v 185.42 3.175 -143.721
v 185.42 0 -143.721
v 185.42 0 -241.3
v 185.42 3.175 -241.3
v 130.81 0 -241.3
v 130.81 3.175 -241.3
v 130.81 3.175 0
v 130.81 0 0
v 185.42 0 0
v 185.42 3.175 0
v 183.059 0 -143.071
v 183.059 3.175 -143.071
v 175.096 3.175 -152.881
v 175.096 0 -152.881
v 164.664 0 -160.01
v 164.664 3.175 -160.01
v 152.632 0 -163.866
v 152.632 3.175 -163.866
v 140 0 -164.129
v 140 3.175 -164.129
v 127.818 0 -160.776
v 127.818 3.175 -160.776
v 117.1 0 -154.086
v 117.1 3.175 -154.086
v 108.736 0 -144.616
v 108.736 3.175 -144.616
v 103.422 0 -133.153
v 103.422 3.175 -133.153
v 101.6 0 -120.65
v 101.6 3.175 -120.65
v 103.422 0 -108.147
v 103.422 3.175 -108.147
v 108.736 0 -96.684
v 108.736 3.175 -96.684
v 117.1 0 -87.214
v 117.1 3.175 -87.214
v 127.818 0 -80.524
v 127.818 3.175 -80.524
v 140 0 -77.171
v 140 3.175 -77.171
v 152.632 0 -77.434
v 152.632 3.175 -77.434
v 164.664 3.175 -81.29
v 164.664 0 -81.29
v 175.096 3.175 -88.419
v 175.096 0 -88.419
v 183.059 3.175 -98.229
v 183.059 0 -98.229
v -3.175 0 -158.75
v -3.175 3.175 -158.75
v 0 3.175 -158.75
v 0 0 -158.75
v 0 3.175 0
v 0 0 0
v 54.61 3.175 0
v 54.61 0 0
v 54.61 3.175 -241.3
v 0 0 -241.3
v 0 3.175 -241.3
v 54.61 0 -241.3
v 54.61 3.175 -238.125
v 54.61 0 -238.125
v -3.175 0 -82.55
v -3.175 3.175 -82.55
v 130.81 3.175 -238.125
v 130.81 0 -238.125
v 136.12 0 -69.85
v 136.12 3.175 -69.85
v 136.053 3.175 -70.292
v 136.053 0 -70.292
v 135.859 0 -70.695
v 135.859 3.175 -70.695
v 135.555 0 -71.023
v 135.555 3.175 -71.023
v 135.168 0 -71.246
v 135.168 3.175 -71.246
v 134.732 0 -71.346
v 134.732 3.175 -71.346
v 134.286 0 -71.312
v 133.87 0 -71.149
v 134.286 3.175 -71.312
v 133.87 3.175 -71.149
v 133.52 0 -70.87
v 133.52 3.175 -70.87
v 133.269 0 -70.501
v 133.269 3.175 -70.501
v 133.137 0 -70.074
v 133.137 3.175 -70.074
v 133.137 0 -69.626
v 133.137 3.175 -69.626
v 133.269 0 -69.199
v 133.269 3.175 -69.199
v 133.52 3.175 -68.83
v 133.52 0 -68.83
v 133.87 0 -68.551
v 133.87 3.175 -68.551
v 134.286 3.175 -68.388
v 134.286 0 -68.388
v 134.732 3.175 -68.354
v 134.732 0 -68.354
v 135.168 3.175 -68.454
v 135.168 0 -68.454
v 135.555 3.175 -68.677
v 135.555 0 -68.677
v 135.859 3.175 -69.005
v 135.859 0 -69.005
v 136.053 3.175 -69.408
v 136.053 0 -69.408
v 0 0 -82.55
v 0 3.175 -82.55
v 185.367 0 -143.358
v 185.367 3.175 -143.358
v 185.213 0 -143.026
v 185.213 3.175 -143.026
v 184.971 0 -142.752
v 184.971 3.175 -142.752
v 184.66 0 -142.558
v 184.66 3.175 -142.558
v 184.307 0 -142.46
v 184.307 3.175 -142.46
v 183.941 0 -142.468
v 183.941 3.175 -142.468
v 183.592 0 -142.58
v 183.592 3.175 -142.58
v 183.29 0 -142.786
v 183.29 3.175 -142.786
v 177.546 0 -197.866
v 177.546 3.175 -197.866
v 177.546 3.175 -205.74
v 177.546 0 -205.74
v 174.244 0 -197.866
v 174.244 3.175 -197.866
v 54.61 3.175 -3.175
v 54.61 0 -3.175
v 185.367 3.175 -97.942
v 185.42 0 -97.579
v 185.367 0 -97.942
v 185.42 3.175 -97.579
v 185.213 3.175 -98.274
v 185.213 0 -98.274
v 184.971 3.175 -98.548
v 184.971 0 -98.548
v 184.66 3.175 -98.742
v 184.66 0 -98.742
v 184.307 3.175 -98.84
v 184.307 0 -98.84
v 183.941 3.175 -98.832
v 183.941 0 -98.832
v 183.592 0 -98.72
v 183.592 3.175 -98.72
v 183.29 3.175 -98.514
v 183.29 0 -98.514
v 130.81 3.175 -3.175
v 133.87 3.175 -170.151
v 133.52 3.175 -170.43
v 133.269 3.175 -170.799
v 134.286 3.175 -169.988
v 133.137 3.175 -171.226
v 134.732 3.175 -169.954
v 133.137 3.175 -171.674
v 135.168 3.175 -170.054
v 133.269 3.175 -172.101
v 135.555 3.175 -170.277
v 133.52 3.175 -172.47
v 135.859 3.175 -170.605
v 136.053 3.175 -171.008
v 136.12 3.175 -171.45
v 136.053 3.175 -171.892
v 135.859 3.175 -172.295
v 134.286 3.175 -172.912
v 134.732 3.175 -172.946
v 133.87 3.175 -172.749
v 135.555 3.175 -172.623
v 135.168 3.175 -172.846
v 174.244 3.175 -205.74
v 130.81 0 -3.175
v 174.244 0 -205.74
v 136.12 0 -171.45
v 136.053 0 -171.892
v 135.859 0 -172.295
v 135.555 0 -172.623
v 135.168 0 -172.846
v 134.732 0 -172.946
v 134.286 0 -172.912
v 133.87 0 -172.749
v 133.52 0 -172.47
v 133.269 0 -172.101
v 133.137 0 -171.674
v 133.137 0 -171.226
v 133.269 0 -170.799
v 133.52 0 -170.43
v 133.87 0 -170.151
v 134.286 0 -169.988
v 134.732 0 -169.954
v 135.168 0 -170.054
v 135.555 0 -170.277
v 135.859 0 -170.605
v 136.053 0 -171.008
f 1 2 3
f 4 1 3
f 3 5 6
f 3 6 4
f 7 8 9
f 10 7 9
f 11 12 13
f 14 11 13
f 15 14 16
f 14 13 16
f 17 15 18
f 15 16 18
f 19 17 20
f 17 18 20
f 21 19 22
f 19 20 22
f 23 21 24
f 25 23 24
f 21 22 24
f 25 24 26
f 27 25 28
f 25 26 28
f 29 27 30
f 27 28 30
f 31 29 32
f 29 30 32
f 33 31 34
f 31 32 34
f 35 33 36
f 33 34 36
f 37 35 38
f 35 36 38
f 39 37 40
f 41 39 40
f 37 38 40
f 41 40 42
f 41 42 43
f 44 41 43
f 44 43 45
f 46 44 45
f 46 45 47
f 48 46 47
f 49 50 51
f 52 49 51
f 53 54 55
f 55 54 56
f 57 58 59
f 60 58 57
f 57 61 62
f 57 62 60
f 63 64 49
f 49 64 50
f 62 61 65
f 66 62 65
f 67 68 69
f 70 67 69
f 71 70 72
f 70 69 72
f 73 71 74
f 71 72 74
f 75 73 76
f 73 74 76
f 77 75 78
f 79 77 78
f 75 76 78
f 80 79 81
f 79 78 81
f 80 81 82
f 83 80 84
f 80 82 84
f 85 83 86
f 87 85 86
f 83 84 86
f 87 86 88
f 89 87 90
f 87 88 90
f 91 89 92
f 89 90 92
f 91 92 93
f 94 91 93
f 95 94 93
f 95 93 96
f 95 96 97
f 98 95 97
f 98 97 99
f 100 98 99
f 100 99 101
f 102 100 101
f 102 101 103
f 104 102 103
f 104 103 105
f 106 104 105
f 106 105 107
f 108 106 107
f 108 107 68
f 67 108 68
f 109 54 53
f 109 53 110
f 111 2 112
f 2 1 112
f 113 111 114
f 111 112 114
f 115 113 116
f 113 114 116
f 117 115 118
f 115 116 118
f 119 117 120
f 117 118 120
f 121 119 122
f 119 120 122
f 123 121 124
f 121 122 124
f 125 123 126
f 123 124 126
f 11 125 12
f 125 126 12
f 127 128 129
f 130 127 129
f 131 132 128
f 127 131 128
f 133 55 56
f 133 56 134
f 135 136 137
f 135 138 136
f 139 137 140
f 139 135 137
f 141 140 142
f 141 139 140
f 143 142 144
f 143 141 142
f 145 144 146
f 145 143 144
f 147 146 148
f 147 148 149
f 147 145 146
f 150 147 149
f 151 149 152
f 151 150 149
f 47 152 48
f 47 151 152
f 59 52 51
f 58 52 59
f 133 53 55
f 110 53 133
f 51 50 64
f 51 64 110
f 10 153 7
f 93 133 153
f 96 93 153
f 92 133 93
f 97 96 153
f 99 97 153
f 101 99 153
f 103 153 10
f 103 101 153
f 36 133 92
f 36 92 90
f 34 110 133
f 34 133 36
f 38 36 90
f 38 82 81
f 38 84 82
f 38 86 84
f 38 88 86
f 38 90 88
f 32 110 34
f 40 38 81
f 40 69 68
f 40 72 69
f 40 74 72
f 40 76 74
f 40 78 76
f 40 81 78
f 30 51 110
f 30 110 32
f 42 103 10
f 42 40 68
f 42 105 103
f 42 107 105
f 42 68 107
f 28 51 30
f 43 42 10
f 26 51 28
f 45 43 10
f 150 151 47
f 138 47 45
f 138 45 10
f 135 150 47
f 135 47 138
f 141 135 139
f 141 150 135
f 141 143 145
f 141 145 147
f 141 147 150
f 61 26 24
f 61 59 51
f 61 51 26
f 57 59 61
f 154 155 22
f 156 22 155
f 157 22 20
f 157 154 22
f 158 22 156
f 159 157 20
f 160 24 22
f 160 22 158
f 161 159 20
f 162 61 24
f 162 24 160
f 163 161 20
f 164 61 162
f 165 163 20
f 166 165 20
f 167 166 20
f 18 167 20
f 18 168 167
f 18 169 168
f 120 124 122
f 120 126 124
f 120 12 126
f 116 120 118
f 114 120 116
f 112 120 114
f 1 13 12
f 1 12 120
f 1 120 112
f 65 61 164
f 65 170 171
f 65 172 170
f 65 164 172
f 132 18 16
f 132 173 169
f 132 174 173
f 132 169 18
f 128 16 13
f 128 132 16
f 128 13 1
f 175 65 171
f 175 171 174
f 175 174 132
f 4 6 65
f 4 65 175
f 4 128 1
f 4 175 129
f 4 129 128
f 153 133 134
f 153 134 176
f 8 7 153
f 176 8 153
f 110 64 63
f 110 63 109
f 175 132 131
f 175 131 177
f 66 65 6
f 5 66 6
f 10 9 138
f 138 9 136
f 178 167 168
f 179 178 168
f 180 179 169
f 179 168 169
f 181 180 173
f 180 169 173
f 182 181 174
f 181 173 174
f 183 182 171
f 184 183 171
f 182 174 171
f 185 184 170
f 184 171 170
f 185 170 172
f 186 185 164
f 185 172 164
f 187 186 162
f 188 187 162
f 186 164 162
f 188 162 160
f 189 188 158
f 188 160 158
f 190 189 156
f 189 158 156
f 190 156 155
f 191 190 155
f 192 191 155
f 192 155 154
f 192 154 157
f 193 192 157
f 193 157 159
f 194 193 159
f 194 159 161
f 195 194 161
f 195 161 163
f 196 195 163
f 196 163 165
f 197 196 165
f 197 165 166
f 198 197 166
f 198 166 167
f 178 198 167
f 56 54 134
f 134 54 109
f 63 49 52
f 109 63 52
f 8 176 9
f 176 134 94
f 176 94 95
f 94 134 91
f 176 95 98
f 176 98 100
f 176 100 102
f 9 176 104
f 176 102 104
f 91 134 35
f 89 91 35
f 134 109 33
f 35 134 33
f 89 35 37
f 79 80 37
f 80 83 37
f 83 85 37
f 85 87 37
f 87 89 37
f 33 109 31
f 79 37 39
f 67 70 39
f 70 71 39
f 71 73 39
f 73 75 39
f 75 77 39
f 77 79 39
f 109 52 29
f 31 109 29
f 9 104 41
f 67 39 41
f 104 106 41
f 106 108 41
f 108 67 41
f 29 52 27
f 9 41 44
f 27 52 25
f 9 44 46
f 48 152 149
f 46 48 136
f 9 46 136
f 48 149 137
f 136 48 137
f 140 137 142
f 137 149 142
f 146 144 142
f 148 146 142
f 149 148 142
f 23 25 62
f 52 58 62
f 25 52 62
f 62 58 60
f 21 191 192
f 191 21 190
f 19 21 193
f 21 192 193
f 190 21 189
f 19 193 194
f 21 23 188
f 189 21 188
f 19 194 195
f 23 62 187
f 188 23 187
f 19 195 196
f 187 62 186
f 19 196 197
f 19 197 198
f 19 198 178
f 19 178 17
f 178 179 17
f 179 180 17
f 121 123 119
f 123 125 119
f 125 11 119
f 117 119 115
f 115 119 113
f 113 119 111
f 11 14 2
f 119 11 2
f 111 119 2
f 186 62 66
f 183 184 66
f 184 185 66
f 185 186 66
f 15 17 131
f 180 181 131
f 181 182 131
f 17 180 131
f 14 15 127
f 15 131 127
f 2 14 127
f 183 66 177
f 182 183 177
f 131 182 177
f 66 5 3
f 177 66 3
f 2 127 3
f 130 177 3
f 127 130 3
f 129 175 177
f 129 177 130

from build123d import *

# Parameters (mm, degrees)
SKETCH1_W           = 185.42
SKETCH1_H           = 241.3
BOSS_EXTRUDE1_DEPTH = 3.175
SKETCH2_R           = 43.815
CUT_EXTRUDE1_DEPTH  = 4.175
SKETCH7_R           = 1.5
CUT_EXTRUDE4_DEPTH  = 4.175
FILLET1_R           = 1.27
SKETCH8_W           = 76.2
SKETCH8_H           = 3.175
CUT_EXTRUDE5_DEPTH  = 4.175
SKETCH11_W          = 3.175
SKETCH11_H          = 76.2
BOSS_EXTRUDE3_DEPTH = 3.175
SKETCH12_W          = 3.302
SKETCH12_H          = 7.874
CUT_EXTRUDE6_DEPTH  = 4.175


with BuildPart() as part:
    # Sketch1 → Boss-Extrude1 (new body)
    with BuildSketch(Plane(origin=(0, 0, 0), x_dir=(1, 0, 0), z_dir=(0, 1, 0))):
        with Locations((92.71, 120.65)):
            Rectangle(SKETCH1_W, SKETCH1_H)
    extrude(amount=BOSS_EXTRUDE1_DEPTH)

    # Sketch2 → Cut-Extrude1 (cut, through all)
    with BuildSketch(Plane(origin=(0, 3.175, 0), x_dir=(1, 0, 0), z_dir=(0, 1, 0))):
        with Locations((145.415, 120.65)):
            Circle(SKETCH2_R)
    extrude(amount=-CUT_EXTRUDE1_DEPTH, mode=Mode.SUBTRACT)

    # Sketch7 → Cut-Extrude4 (cut, through all)
    with BuildSketch(Plane(origin=(0, 3.175, 0), x_dir=(1, 0, 0), z_dir=(0, 1, 0))):
        with Locations((134.62, 171.45)):
            Circle(SKETCH7_R)
        with Locations((134.62, 69.85)):
            Circle(SKETCH7_R)
    extrude(amount=-CUT_EXTRUDE4_DEPTH, mode=Mode.SUBTRACT)

    # Fillet1
    fillet1_edges = [part.edges().sort_by_distance(p)[0] for p in [
        (185.42, 1.5875, -102.779515955),
        (185.42, 1.5875, -138.520484045),
    ]]
    fillet(fillet1_edges, radius=FILLET1_R)

    # Sketch8 → Cut-Extrude5 (cut, through all)
    with BuildSketch(Plane(origin=(0, 3.175, 0), x_dir=(1, 0, 0), z_dir=(0, 1, 0))):
        with Locations((92.71, 239.7125)):
            Rectangle(SKETCH8_W, SKETCH8_H)
        with Locations((92.71, 1.5875)):
            Rectangle(SKETCH8_W, SKETCH8_H)
    extrude(amount=-CUT_EXTRUDE5_DEPTH, mode=Mode.SUBTRACT)

    # Sketch11 → Boss-Extrude3 (add)
    with BuildSketch(Plane(origin=(0, 3.175, 0), x_dir=(1, 0, 0), z_dir=(0, 1, 0))):
        with Locations((-1.5875, 120.65)):
            Rectangle(SKETCH11_W, SKETCH11_H)
    extrude(amount=-BOSS_EXTRUDE3_DEPTH)

    # Sketch12 → Cut-Extrude6 (cut, through all)
    with BuildSketch(Plane(origin=(0, 3.175, 0), x_dir=(1, 0, 0), z_dir=(0, 1, 0))):
        with Locations((175.895, 201.803)):
            Rectangle(SKETCH12_W, SKETCH12_H)
    extrude(amount=-CUT_EXTRUDE6_DEPTH, mode=Mode.SUBTRACT)


solid = part.part
